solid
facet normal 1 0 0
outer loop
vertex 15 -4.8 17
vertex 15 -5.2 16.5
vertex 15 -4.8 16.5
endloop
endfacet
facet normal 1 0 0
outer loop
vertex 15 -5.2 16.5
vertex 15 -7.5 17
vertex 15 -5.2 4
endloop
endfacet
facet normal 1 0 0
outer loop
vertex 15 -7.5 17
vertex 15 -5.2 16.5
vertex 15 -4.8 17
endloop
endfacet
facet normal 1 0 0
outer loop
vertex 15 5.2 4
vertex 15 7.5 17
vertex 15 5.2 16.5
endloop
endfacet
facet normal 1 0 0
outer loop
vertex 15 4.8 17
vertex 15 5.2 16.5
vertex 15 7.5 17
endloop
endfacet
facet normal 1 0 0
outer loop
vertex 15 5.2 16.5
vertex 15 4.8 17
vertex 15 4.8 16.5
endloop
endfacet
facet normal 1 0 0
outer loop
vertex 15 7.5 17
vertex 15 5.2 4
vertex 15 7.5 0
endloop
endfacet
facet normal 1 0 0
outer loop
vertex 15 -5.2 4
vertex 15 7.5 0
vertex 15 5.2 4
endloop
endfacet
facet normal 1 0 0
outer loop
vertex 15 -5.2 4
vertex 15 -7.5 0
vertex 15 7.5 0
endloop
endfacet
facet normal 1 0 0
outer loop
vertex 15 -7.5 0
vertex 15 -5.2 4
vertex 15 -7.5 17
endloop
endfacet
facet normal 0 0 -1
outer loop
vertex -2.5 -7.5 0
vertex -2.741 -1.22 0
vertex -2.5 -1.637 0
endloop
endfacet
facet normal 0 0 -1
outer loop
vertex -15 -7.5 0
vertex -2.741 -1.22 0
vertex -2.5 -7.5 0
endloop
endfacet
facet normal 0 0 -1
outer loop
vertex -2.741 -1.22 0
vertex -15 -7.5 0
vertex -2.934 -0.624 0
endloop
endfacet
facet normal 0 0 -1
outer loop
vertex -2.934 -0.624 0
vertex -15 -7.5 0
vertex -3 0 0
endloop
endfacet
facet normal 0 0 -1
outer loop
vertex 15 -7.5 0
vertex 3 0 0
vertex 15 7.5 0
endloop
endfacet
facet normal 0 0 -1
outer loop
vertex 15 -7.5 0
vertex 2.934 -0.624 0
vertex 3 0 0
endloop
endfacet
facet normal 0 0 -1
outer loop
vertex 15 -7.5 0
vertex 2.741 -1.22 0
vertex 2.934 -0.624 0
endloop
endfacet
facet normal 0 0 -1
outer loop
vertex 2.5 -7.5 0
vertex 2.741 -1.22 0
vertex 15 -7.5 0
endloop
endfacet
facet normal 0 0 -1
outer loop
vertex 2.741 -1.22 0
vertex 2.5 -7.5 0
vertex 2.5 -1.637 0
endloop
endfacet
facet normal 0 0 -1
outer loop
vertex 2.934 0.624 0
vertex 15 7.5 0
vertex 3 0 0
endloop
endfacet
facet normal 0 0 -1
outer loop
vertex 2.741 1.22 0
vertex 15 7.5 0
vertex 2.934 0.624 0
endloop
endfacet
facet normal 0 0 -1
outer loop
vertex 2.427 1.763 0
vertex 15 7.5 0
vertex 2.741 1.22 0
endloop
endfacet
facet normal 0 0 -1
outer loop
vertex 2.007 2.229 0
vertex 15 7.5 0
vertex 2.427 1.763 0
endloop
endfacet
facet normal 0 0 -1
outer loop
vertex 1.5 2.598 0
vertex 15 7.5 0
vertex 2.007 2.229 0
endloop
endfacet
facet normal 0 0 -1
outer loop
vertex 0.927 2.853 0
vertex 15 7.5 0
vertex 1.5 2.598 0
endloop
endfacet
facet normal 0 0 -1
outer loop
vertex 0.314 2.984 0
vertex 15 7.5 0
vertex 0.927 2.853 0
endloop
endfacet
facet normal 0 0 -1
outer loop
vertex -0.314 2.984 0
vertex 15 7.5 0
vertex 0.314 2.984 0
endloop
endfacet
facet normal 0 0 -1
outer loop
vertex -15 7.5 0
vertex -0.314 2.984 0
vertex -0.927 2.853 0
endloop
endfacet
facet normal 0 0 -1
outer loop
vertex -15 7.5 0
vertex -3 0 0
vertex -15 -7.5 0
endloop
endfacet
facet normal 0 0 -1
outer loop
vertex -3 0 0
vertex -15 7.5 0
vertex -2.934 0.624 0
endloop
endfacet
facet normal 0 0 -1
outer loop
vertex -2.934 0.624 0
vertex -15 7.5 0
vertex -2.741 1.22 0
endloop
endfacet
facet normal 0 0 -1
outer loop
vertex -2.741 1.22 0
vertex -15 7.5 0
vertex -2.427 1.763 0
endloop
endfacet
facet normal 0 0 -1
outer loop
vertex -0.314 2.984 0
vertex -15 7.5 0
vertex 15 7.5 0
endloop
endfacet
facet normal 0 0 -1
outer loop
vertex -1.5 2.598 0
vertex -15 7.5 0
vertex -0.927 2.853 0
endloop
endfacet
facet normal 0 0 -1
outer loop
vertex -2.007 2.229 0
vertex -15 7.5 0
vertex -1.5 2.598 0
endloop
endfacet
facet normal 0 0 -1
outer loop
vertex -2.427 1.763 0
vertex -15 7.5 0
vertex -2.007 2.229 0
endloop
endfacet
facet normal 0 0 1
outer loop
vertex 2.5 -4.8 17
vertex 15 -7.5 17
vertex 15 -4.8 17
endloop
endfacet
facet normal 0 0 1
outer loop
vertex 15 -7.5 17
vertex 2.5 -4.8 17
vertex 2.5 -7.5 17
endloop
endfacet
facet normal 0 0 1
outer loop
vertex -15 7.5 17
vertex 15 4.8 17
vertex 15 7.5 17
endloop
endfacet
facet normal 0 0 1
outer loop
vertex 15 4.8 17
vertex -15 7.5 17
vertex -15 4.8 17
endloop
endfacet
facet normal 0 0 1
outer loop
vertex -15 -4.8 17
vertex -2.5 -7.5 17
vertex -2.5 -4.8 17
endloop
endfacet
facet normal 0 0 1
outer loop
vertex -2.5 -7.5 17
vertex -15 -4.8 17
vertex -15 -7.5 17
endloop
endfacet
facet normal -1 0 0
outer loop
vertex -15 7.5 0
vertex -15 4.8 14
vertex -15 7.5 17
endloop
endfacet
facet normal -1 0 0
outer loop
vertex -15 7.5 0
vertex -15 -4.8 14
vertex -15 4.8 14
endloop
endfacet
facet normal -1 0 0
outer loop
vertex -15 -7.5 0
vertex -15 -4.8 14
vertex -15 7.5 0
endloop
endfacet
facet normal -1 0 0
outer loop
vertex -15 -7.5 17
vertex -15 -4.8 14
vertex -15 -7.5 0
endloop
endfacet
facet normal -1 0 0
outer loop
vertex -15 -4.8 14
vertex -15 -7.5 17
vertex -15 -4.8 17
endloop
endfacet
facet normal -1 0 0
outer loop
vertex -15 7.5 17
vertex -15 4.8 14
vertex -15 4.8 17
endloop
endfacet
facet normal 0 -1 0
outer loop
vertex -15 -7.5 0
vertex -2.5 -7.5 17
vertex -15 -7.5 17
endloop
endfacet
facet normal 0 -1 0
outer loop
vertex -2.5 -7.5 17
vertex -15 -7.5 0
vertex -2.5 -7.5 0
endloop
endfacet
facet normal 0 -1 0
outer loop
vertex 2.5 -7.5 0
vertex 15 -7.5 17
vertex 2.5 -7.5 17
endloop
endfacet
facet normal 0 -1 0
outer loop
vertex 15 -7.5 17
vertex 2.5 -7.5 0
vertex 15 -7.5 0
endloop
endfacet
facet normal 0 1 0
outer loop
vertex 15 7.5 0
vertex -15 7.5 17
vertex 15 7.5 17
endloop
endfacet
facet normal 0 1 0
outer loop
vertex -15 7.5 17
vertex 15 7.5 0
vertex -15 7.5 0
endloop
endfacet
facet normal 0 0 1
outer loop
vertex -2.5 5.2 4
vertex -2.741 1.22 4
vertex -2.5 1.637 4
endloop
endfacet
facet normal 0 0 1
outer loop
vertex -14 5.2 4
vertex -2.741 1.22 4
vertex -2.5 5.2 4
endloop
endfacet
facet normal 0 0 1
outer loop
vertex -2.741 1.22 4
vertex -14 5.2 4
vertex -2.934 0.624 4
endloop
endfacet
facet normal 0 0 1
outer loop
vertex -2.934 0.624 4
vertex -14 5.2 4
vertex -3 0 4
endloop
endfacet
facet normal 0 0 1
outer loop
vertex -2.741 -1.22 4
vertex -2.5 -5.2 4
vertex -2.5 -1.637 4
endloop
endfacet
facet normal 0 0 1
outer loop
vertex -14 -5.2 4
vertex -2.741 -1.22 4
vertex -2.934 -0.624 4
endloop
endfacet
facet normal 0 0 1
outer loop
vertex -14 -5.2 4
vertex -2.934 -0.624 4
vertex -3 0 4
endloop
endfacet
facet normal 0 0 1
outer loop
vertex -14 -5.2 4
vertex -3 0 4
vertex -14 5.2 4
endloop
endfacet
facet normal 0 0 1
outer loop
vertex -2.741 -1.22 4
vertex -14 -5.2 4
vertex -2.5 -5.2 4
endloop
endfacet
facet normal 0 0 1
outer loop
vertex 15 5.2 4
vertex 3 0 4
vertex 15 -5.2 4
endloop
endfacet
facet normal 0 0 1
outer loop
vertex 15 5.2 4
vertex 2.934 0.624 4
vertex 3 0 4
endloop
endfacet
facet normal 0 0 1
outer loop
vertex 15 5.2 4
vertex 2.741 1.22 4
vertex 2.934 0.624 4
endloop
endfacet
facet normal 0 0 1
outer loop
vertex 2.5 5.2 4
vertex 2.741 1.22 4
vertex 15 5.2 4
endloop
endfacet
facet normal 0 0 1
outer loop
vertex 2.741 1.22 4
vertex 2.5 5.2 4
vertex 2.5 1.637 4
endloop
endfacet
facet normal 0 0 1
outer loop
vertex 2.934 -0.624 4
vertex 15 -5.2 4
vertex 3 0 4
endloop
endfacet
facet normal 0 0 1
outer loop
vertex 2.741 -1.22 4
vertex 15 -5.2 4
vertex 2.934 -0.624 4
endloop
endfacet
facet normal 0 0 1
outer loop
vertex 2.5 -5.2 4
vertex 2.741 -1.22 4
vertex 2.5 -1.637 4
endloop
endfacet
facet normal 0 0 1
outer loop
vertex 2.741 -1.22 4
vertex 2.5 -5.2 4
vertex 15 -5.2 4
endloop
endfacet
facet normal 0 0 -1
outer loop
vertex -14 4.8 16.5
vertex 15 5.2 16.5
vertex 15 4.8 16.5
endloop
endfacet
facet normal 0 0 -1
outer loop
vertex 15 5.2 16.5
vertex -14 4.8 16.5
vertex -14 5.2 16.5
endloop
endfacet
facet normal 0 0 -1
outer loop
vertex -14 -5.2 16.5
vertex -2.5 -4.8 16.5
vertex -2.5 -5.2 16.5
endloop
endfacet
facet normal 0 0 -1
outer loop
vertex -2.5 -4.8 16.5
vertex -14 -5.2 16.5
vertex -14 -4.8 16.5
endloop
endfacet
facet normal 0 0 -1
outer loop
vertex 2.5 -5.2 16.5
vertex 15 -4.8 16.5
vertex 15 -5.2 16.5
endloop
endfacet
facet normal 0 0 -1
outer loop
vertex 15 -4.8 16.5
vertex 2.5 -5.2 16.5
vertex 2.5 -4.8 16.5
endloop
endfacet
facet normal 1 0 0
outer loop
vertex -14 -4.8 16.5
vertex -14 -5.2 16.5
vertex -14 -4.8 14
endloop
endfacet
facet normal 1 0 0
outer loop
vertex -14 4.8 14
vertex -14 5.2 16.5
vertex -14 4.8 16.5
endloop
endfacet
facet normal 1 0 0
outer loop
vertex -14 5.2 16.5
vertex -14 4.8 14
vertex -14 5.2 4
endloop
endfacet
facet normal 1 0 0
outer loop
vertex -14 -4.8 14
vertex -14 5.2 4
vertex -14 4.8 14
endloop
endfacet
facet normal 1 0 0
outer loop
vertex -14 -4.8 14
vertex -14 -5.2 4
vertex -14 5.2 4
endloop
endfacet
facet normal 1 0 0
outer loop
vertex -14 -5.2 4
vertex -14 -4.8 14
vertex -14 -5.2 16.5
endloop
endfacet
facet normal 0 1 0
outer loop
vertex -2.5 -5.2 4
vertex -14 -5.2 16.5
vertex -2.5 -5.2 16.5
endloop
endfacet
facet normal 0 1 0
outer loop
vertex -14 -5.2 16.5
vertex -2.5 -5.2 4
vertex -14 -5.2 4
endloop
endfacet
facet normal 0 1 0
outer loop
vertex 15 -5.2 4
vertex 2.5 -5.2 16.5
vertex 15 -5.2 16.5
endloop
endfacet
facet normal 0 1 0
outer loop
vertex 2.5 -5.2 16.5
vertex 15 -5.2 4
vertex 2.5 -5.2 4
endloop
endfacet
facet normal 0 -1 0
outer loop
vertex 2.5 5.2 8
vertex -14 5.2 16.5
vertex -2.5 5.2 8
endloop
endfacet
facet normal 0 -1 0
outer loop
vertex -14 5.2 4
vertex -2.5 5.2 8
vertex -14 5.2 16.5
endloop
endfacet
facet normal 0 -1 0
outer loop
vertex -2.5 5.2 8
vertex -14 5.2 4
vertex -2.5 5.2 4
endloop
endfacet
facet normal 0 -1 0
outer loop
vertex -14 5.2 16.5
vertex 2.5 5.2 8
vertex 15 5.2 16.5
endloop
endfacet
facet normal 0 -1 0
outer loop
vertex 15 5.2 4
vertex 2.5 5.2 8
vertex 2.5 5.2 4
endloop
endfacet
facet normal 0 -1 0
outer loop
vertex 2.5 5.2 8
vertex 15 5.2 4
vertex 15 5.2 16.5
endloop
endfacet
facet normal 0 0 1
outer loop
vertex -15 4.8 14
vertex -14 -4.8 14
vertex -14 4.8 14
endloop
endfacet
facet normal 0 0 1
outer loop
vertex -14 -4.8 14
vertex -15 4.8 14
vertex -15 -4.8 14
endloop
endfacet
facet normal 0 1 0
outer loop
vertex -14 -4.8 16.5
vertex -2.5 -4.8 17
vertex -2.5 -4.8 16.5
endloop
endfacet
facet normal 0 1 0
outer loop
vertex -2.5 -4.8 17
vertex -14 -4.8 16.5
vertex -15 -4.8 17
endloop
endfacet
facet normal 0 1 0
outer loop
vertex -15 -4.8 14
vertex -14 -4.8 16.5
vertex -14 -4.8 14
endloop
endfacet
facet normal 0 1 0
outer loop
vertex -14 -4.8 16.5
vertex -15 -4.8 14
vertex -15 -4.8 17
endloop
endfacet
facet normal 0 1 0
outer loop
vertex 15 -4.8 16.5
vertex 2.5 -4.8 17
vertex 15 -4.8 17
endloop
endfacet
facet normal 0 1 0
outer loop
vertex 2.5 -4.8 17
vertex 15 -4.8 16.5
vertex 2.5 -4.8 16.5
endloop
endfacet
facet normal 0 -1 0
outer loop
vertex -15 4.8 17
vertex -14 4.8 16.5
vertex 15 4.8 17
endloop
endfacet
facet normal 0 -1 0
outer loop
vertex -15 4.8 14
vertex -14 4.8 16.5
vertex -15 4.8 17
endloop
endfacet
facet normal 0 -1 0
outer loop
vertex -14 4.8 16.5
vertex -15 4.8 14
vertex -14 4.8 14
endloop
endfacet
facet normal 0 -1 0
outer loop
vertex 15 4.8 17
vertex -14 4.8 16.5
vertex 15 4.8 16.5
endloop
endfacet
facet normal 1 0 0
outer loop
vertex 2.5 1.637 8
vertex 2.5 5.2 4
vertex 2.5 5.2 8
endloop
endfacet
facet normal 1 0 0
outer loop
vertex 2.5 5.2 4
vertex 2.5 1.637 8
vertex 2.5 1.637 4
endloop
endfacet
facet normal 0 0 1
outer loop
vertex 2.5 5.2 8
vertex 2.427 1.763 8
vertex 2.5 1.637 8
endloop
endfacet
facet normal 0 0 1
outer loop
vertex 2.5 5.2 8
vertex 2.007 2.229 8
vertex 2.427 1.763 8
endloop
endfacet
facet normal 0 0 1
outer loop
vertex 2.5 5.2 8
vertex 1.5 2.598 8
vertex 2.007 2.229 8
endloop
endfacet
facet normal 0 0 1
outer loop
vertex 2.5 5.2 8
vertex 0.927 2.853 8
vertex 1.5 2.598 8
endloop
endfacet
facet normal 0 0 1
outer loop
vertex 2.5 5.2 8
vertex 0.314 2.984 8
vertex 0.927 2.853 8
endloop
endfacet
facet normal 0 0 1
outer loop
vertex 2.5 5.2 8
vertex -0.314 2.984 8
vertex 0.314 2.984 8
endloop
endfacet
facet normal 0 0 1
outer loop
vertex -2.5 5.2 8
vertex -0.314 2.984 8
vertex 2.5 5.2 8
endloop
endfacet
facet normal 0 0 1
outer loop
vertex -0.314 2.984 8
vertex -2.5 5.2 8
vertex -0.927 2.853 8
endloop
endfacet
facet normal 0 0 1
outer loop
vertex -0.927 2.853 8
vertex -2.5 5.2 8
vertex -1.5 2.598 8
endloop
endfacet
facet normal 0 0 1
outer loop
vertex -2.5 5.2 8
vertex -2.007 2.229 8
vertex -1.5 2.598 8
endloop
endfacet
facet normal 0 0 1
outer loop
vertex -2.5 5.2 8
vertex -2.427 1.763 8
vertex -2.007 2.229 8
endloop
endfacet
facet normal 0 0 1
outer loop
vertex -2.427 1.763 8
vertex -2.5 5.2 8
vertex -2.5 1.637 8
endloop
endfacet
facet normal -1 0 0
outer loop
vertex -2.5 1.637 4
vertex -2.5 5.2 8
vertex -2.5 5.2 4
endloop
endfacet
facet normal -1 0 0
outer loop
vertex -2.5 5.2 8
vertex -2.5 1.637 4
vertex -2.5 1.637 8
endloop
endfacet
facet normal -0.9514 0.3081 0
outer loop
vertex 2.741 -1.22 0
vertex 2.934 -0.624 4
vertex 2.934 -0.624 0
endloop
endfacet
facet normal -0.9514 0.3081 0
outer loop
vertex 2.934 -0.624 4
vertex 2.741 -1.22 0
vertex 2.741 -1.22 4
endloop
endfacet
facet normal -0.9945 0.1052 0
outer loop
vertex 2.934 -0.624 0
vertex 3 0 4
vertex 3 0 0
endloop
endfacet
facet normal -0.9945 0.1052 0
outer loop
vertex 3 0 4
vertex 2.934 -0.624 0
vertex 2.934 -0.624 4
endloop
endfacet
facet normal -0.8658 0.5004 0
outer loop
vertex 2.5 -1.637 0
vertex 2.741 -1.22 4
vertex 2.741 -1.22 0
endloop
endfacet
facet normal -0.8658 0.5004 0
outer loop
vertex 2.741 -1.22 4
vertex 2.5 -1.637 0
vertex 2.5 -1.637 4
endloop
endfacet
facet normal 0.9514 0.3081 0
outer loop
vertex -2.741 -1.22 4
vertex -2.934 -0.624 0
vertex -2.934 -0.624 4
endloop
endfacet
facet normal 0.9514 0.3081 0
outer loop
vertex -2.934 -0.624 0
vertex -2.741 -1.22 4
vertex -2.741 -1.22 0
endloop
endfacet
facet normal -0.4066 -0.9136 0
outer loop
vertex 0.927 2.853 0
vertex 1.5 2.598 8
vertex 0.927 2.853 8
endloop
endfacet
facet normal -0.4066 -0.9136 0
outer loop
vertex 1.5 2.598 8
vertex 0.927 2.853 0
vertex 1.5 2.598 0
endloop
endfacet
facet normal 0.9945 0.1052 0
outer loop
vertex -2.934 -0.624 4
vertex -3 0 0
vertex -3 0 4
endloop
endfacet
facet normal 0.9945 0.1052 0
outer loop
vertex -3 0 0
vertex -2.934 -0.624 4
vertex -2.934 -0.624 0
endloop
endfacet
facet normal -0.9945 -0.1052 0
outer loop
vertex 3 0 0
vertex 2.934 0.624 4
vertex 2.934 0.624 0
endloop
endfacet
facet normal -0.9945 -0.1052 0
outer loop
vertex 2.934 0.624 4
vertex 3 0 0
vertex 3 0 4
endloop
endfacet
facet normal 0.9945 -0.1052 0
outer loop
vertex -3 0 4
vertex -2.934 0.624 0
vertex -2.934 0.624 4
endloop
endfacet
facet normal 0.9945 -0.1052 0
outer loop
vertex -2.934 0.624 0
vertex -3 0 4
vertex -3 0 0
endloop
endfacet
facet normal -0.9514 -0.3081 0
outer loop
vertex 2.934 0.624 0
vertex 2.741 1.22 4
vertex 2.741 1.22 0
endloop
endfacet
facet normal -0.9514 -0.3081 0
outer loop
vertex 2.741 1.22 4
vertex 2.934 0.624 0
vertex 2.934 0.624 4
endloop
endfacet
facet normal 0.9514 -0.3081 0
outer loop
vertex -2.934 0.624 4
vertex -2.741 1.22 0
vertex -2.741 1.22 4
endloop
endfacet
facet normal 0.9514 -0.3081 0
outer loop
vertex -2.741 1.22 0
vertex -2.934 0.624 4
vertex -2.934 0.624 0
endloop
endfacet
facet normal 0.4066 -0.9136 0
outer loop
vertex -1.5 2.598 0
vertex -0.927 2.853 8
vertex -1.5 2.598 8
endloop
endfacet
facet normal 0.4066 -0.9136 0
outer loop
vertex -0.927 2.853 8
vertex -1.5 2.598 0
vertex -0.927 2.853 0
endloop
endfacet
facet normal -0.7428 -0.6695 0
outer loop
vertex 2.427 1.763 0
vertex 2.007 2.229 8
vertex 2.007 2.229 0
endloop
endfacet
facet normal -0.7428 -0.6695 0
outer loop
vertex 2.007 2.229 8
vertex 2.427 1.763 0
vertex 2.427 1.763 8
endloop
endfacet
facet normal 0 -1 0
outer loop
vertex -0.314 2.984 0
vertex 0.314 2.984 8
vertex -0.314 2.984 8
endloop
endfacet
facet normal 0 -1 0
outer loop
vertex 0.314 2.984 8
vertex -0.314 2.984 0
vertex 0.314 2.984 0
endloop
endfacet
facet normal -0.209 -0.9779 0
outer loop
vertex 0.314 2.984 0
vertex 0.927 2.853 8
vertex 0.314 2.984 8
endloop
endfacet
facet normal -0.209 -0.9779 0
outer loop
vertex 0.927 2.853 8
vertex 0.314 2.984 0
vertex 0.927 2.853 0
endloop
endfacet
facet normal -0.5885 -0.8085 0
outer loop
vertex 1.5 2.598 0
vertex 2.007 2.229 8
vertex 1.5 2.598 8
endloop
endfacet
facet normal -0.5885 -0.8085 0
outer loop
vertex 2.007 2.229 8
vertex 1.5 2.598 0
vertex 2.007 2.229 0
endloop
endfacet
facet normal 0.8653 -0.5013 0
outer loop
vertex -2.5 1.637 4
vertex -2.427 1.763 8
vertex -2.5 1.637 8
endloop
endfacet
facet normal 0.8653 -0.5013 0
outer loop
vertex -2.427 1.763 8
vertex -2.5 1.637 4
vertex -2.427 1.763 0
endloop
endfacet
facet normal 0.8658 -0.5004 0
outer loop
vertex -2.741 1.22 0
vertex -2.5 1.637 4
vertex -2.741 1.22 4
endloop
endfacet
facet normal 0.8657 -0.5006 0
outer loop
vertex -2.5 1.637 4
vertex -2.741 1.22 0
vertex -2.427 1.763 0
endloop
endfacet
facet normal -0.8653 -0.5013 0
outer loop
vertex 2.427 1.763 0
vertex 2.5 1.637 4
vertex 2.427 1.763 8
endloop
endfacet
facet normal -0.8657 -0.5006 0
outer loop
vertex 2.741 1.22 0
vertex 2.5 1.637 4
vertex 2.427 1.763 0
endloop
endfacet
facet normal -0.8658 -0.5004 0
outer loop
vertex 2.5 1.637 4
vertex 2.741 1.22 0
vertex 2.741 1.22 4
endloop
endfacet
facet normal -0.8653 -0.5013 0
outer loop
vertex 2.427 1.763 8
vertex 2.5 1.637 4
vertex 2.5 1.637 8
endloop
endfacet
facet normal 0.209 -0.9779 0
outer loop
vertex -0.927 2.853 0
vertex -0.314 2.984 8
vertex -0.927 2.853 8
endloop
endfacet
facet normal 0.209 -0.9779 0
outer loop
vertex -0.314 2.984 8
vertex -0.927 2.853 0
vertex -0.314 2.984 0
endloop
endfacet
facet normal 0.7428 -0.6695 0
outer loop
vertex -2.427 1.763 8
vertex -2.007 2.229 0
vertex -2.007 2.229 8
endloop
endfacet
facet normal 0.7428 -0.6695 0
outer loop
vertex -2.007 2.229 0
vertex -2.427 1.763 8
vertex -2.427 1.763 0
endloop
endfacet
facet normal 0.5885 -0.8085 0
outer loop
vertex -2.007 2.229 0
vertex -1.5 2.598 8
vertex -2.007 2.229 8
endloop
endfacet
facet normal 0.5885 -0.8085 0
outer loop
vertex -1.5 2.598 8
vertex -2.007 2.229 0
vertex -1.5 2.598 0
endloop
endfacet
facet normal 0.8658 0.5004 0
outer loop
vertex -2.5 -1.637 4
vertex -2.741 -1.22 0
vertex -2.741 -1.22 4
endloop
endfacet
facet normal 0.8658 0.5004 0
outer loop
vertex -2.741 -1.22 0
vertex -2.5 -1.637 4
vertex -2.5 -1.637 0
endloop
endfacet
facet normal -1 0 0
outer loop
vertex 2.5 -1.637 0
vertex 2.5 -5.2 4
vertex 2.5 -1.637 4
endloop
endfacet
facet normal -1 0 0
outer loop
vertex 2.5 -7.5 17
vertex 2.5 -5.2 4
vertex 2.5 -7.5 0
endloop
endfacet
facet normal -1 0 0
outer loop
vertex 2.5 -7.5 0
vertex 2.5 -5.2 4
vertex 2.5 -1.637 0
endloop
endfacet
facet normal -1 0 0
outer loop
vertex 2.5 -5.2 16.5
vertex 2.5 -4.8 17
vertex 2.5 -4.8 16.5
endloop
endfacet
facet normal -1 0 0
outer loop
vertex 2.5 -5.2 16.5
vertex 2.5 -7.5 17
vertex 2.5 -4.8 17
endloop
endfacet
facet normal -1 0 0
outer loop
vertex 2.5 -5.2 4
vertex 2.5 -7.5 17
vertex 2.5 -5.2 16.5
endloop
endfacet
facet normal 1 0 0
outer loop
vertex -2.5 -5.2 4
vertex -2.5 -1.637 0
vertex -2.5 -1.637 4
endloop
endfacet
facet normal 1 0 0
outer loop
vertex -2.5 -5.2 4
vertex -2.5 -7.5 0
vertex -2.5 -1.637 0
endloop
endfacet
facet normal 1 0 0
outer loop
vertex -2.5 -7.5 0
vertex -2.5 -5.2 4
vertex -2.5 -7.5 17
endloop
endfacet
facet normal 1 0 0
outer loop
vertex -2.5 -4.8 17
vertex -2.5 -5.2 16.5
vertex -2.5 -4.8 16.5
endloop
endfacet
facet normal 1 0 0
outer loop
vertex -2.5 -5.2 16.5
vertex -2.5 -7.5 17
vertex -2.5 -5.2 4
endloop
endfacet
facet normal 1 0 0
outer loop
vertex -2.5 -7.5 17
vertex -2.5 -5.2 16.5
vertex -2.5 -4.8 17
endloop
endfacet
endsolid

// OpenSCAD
// Bracket to hold the bowden tube firmly in place
// on a minimalistic-zen-replacement extruder.
//
// 2014-06-24, juewei@fabfolk.com
//
// This part is an add-on to https://www.youmagine.com/designs/minimalistic-zen-replacement
//
translate([-15,0,17])rotate([180,0,0])
difference()
{
   union()
   {
	  difference()
	  {
	
	    translate([0,-7.5,0])cube([30,15,17]);
	    translate([1,-5.2,.5])cube([30,10.4,12.5]);
       translate([-2,-4.8,-1])cube([34,9.6, 4]);
	  };
     translate([12.5,-7,9])cube([5,8,8]);
  };
  translate([15,0,-5])cylinder(h=30, r=3, $fs=.5);
  translate([12.5,0,-2])cube([5,10,25]);
};
